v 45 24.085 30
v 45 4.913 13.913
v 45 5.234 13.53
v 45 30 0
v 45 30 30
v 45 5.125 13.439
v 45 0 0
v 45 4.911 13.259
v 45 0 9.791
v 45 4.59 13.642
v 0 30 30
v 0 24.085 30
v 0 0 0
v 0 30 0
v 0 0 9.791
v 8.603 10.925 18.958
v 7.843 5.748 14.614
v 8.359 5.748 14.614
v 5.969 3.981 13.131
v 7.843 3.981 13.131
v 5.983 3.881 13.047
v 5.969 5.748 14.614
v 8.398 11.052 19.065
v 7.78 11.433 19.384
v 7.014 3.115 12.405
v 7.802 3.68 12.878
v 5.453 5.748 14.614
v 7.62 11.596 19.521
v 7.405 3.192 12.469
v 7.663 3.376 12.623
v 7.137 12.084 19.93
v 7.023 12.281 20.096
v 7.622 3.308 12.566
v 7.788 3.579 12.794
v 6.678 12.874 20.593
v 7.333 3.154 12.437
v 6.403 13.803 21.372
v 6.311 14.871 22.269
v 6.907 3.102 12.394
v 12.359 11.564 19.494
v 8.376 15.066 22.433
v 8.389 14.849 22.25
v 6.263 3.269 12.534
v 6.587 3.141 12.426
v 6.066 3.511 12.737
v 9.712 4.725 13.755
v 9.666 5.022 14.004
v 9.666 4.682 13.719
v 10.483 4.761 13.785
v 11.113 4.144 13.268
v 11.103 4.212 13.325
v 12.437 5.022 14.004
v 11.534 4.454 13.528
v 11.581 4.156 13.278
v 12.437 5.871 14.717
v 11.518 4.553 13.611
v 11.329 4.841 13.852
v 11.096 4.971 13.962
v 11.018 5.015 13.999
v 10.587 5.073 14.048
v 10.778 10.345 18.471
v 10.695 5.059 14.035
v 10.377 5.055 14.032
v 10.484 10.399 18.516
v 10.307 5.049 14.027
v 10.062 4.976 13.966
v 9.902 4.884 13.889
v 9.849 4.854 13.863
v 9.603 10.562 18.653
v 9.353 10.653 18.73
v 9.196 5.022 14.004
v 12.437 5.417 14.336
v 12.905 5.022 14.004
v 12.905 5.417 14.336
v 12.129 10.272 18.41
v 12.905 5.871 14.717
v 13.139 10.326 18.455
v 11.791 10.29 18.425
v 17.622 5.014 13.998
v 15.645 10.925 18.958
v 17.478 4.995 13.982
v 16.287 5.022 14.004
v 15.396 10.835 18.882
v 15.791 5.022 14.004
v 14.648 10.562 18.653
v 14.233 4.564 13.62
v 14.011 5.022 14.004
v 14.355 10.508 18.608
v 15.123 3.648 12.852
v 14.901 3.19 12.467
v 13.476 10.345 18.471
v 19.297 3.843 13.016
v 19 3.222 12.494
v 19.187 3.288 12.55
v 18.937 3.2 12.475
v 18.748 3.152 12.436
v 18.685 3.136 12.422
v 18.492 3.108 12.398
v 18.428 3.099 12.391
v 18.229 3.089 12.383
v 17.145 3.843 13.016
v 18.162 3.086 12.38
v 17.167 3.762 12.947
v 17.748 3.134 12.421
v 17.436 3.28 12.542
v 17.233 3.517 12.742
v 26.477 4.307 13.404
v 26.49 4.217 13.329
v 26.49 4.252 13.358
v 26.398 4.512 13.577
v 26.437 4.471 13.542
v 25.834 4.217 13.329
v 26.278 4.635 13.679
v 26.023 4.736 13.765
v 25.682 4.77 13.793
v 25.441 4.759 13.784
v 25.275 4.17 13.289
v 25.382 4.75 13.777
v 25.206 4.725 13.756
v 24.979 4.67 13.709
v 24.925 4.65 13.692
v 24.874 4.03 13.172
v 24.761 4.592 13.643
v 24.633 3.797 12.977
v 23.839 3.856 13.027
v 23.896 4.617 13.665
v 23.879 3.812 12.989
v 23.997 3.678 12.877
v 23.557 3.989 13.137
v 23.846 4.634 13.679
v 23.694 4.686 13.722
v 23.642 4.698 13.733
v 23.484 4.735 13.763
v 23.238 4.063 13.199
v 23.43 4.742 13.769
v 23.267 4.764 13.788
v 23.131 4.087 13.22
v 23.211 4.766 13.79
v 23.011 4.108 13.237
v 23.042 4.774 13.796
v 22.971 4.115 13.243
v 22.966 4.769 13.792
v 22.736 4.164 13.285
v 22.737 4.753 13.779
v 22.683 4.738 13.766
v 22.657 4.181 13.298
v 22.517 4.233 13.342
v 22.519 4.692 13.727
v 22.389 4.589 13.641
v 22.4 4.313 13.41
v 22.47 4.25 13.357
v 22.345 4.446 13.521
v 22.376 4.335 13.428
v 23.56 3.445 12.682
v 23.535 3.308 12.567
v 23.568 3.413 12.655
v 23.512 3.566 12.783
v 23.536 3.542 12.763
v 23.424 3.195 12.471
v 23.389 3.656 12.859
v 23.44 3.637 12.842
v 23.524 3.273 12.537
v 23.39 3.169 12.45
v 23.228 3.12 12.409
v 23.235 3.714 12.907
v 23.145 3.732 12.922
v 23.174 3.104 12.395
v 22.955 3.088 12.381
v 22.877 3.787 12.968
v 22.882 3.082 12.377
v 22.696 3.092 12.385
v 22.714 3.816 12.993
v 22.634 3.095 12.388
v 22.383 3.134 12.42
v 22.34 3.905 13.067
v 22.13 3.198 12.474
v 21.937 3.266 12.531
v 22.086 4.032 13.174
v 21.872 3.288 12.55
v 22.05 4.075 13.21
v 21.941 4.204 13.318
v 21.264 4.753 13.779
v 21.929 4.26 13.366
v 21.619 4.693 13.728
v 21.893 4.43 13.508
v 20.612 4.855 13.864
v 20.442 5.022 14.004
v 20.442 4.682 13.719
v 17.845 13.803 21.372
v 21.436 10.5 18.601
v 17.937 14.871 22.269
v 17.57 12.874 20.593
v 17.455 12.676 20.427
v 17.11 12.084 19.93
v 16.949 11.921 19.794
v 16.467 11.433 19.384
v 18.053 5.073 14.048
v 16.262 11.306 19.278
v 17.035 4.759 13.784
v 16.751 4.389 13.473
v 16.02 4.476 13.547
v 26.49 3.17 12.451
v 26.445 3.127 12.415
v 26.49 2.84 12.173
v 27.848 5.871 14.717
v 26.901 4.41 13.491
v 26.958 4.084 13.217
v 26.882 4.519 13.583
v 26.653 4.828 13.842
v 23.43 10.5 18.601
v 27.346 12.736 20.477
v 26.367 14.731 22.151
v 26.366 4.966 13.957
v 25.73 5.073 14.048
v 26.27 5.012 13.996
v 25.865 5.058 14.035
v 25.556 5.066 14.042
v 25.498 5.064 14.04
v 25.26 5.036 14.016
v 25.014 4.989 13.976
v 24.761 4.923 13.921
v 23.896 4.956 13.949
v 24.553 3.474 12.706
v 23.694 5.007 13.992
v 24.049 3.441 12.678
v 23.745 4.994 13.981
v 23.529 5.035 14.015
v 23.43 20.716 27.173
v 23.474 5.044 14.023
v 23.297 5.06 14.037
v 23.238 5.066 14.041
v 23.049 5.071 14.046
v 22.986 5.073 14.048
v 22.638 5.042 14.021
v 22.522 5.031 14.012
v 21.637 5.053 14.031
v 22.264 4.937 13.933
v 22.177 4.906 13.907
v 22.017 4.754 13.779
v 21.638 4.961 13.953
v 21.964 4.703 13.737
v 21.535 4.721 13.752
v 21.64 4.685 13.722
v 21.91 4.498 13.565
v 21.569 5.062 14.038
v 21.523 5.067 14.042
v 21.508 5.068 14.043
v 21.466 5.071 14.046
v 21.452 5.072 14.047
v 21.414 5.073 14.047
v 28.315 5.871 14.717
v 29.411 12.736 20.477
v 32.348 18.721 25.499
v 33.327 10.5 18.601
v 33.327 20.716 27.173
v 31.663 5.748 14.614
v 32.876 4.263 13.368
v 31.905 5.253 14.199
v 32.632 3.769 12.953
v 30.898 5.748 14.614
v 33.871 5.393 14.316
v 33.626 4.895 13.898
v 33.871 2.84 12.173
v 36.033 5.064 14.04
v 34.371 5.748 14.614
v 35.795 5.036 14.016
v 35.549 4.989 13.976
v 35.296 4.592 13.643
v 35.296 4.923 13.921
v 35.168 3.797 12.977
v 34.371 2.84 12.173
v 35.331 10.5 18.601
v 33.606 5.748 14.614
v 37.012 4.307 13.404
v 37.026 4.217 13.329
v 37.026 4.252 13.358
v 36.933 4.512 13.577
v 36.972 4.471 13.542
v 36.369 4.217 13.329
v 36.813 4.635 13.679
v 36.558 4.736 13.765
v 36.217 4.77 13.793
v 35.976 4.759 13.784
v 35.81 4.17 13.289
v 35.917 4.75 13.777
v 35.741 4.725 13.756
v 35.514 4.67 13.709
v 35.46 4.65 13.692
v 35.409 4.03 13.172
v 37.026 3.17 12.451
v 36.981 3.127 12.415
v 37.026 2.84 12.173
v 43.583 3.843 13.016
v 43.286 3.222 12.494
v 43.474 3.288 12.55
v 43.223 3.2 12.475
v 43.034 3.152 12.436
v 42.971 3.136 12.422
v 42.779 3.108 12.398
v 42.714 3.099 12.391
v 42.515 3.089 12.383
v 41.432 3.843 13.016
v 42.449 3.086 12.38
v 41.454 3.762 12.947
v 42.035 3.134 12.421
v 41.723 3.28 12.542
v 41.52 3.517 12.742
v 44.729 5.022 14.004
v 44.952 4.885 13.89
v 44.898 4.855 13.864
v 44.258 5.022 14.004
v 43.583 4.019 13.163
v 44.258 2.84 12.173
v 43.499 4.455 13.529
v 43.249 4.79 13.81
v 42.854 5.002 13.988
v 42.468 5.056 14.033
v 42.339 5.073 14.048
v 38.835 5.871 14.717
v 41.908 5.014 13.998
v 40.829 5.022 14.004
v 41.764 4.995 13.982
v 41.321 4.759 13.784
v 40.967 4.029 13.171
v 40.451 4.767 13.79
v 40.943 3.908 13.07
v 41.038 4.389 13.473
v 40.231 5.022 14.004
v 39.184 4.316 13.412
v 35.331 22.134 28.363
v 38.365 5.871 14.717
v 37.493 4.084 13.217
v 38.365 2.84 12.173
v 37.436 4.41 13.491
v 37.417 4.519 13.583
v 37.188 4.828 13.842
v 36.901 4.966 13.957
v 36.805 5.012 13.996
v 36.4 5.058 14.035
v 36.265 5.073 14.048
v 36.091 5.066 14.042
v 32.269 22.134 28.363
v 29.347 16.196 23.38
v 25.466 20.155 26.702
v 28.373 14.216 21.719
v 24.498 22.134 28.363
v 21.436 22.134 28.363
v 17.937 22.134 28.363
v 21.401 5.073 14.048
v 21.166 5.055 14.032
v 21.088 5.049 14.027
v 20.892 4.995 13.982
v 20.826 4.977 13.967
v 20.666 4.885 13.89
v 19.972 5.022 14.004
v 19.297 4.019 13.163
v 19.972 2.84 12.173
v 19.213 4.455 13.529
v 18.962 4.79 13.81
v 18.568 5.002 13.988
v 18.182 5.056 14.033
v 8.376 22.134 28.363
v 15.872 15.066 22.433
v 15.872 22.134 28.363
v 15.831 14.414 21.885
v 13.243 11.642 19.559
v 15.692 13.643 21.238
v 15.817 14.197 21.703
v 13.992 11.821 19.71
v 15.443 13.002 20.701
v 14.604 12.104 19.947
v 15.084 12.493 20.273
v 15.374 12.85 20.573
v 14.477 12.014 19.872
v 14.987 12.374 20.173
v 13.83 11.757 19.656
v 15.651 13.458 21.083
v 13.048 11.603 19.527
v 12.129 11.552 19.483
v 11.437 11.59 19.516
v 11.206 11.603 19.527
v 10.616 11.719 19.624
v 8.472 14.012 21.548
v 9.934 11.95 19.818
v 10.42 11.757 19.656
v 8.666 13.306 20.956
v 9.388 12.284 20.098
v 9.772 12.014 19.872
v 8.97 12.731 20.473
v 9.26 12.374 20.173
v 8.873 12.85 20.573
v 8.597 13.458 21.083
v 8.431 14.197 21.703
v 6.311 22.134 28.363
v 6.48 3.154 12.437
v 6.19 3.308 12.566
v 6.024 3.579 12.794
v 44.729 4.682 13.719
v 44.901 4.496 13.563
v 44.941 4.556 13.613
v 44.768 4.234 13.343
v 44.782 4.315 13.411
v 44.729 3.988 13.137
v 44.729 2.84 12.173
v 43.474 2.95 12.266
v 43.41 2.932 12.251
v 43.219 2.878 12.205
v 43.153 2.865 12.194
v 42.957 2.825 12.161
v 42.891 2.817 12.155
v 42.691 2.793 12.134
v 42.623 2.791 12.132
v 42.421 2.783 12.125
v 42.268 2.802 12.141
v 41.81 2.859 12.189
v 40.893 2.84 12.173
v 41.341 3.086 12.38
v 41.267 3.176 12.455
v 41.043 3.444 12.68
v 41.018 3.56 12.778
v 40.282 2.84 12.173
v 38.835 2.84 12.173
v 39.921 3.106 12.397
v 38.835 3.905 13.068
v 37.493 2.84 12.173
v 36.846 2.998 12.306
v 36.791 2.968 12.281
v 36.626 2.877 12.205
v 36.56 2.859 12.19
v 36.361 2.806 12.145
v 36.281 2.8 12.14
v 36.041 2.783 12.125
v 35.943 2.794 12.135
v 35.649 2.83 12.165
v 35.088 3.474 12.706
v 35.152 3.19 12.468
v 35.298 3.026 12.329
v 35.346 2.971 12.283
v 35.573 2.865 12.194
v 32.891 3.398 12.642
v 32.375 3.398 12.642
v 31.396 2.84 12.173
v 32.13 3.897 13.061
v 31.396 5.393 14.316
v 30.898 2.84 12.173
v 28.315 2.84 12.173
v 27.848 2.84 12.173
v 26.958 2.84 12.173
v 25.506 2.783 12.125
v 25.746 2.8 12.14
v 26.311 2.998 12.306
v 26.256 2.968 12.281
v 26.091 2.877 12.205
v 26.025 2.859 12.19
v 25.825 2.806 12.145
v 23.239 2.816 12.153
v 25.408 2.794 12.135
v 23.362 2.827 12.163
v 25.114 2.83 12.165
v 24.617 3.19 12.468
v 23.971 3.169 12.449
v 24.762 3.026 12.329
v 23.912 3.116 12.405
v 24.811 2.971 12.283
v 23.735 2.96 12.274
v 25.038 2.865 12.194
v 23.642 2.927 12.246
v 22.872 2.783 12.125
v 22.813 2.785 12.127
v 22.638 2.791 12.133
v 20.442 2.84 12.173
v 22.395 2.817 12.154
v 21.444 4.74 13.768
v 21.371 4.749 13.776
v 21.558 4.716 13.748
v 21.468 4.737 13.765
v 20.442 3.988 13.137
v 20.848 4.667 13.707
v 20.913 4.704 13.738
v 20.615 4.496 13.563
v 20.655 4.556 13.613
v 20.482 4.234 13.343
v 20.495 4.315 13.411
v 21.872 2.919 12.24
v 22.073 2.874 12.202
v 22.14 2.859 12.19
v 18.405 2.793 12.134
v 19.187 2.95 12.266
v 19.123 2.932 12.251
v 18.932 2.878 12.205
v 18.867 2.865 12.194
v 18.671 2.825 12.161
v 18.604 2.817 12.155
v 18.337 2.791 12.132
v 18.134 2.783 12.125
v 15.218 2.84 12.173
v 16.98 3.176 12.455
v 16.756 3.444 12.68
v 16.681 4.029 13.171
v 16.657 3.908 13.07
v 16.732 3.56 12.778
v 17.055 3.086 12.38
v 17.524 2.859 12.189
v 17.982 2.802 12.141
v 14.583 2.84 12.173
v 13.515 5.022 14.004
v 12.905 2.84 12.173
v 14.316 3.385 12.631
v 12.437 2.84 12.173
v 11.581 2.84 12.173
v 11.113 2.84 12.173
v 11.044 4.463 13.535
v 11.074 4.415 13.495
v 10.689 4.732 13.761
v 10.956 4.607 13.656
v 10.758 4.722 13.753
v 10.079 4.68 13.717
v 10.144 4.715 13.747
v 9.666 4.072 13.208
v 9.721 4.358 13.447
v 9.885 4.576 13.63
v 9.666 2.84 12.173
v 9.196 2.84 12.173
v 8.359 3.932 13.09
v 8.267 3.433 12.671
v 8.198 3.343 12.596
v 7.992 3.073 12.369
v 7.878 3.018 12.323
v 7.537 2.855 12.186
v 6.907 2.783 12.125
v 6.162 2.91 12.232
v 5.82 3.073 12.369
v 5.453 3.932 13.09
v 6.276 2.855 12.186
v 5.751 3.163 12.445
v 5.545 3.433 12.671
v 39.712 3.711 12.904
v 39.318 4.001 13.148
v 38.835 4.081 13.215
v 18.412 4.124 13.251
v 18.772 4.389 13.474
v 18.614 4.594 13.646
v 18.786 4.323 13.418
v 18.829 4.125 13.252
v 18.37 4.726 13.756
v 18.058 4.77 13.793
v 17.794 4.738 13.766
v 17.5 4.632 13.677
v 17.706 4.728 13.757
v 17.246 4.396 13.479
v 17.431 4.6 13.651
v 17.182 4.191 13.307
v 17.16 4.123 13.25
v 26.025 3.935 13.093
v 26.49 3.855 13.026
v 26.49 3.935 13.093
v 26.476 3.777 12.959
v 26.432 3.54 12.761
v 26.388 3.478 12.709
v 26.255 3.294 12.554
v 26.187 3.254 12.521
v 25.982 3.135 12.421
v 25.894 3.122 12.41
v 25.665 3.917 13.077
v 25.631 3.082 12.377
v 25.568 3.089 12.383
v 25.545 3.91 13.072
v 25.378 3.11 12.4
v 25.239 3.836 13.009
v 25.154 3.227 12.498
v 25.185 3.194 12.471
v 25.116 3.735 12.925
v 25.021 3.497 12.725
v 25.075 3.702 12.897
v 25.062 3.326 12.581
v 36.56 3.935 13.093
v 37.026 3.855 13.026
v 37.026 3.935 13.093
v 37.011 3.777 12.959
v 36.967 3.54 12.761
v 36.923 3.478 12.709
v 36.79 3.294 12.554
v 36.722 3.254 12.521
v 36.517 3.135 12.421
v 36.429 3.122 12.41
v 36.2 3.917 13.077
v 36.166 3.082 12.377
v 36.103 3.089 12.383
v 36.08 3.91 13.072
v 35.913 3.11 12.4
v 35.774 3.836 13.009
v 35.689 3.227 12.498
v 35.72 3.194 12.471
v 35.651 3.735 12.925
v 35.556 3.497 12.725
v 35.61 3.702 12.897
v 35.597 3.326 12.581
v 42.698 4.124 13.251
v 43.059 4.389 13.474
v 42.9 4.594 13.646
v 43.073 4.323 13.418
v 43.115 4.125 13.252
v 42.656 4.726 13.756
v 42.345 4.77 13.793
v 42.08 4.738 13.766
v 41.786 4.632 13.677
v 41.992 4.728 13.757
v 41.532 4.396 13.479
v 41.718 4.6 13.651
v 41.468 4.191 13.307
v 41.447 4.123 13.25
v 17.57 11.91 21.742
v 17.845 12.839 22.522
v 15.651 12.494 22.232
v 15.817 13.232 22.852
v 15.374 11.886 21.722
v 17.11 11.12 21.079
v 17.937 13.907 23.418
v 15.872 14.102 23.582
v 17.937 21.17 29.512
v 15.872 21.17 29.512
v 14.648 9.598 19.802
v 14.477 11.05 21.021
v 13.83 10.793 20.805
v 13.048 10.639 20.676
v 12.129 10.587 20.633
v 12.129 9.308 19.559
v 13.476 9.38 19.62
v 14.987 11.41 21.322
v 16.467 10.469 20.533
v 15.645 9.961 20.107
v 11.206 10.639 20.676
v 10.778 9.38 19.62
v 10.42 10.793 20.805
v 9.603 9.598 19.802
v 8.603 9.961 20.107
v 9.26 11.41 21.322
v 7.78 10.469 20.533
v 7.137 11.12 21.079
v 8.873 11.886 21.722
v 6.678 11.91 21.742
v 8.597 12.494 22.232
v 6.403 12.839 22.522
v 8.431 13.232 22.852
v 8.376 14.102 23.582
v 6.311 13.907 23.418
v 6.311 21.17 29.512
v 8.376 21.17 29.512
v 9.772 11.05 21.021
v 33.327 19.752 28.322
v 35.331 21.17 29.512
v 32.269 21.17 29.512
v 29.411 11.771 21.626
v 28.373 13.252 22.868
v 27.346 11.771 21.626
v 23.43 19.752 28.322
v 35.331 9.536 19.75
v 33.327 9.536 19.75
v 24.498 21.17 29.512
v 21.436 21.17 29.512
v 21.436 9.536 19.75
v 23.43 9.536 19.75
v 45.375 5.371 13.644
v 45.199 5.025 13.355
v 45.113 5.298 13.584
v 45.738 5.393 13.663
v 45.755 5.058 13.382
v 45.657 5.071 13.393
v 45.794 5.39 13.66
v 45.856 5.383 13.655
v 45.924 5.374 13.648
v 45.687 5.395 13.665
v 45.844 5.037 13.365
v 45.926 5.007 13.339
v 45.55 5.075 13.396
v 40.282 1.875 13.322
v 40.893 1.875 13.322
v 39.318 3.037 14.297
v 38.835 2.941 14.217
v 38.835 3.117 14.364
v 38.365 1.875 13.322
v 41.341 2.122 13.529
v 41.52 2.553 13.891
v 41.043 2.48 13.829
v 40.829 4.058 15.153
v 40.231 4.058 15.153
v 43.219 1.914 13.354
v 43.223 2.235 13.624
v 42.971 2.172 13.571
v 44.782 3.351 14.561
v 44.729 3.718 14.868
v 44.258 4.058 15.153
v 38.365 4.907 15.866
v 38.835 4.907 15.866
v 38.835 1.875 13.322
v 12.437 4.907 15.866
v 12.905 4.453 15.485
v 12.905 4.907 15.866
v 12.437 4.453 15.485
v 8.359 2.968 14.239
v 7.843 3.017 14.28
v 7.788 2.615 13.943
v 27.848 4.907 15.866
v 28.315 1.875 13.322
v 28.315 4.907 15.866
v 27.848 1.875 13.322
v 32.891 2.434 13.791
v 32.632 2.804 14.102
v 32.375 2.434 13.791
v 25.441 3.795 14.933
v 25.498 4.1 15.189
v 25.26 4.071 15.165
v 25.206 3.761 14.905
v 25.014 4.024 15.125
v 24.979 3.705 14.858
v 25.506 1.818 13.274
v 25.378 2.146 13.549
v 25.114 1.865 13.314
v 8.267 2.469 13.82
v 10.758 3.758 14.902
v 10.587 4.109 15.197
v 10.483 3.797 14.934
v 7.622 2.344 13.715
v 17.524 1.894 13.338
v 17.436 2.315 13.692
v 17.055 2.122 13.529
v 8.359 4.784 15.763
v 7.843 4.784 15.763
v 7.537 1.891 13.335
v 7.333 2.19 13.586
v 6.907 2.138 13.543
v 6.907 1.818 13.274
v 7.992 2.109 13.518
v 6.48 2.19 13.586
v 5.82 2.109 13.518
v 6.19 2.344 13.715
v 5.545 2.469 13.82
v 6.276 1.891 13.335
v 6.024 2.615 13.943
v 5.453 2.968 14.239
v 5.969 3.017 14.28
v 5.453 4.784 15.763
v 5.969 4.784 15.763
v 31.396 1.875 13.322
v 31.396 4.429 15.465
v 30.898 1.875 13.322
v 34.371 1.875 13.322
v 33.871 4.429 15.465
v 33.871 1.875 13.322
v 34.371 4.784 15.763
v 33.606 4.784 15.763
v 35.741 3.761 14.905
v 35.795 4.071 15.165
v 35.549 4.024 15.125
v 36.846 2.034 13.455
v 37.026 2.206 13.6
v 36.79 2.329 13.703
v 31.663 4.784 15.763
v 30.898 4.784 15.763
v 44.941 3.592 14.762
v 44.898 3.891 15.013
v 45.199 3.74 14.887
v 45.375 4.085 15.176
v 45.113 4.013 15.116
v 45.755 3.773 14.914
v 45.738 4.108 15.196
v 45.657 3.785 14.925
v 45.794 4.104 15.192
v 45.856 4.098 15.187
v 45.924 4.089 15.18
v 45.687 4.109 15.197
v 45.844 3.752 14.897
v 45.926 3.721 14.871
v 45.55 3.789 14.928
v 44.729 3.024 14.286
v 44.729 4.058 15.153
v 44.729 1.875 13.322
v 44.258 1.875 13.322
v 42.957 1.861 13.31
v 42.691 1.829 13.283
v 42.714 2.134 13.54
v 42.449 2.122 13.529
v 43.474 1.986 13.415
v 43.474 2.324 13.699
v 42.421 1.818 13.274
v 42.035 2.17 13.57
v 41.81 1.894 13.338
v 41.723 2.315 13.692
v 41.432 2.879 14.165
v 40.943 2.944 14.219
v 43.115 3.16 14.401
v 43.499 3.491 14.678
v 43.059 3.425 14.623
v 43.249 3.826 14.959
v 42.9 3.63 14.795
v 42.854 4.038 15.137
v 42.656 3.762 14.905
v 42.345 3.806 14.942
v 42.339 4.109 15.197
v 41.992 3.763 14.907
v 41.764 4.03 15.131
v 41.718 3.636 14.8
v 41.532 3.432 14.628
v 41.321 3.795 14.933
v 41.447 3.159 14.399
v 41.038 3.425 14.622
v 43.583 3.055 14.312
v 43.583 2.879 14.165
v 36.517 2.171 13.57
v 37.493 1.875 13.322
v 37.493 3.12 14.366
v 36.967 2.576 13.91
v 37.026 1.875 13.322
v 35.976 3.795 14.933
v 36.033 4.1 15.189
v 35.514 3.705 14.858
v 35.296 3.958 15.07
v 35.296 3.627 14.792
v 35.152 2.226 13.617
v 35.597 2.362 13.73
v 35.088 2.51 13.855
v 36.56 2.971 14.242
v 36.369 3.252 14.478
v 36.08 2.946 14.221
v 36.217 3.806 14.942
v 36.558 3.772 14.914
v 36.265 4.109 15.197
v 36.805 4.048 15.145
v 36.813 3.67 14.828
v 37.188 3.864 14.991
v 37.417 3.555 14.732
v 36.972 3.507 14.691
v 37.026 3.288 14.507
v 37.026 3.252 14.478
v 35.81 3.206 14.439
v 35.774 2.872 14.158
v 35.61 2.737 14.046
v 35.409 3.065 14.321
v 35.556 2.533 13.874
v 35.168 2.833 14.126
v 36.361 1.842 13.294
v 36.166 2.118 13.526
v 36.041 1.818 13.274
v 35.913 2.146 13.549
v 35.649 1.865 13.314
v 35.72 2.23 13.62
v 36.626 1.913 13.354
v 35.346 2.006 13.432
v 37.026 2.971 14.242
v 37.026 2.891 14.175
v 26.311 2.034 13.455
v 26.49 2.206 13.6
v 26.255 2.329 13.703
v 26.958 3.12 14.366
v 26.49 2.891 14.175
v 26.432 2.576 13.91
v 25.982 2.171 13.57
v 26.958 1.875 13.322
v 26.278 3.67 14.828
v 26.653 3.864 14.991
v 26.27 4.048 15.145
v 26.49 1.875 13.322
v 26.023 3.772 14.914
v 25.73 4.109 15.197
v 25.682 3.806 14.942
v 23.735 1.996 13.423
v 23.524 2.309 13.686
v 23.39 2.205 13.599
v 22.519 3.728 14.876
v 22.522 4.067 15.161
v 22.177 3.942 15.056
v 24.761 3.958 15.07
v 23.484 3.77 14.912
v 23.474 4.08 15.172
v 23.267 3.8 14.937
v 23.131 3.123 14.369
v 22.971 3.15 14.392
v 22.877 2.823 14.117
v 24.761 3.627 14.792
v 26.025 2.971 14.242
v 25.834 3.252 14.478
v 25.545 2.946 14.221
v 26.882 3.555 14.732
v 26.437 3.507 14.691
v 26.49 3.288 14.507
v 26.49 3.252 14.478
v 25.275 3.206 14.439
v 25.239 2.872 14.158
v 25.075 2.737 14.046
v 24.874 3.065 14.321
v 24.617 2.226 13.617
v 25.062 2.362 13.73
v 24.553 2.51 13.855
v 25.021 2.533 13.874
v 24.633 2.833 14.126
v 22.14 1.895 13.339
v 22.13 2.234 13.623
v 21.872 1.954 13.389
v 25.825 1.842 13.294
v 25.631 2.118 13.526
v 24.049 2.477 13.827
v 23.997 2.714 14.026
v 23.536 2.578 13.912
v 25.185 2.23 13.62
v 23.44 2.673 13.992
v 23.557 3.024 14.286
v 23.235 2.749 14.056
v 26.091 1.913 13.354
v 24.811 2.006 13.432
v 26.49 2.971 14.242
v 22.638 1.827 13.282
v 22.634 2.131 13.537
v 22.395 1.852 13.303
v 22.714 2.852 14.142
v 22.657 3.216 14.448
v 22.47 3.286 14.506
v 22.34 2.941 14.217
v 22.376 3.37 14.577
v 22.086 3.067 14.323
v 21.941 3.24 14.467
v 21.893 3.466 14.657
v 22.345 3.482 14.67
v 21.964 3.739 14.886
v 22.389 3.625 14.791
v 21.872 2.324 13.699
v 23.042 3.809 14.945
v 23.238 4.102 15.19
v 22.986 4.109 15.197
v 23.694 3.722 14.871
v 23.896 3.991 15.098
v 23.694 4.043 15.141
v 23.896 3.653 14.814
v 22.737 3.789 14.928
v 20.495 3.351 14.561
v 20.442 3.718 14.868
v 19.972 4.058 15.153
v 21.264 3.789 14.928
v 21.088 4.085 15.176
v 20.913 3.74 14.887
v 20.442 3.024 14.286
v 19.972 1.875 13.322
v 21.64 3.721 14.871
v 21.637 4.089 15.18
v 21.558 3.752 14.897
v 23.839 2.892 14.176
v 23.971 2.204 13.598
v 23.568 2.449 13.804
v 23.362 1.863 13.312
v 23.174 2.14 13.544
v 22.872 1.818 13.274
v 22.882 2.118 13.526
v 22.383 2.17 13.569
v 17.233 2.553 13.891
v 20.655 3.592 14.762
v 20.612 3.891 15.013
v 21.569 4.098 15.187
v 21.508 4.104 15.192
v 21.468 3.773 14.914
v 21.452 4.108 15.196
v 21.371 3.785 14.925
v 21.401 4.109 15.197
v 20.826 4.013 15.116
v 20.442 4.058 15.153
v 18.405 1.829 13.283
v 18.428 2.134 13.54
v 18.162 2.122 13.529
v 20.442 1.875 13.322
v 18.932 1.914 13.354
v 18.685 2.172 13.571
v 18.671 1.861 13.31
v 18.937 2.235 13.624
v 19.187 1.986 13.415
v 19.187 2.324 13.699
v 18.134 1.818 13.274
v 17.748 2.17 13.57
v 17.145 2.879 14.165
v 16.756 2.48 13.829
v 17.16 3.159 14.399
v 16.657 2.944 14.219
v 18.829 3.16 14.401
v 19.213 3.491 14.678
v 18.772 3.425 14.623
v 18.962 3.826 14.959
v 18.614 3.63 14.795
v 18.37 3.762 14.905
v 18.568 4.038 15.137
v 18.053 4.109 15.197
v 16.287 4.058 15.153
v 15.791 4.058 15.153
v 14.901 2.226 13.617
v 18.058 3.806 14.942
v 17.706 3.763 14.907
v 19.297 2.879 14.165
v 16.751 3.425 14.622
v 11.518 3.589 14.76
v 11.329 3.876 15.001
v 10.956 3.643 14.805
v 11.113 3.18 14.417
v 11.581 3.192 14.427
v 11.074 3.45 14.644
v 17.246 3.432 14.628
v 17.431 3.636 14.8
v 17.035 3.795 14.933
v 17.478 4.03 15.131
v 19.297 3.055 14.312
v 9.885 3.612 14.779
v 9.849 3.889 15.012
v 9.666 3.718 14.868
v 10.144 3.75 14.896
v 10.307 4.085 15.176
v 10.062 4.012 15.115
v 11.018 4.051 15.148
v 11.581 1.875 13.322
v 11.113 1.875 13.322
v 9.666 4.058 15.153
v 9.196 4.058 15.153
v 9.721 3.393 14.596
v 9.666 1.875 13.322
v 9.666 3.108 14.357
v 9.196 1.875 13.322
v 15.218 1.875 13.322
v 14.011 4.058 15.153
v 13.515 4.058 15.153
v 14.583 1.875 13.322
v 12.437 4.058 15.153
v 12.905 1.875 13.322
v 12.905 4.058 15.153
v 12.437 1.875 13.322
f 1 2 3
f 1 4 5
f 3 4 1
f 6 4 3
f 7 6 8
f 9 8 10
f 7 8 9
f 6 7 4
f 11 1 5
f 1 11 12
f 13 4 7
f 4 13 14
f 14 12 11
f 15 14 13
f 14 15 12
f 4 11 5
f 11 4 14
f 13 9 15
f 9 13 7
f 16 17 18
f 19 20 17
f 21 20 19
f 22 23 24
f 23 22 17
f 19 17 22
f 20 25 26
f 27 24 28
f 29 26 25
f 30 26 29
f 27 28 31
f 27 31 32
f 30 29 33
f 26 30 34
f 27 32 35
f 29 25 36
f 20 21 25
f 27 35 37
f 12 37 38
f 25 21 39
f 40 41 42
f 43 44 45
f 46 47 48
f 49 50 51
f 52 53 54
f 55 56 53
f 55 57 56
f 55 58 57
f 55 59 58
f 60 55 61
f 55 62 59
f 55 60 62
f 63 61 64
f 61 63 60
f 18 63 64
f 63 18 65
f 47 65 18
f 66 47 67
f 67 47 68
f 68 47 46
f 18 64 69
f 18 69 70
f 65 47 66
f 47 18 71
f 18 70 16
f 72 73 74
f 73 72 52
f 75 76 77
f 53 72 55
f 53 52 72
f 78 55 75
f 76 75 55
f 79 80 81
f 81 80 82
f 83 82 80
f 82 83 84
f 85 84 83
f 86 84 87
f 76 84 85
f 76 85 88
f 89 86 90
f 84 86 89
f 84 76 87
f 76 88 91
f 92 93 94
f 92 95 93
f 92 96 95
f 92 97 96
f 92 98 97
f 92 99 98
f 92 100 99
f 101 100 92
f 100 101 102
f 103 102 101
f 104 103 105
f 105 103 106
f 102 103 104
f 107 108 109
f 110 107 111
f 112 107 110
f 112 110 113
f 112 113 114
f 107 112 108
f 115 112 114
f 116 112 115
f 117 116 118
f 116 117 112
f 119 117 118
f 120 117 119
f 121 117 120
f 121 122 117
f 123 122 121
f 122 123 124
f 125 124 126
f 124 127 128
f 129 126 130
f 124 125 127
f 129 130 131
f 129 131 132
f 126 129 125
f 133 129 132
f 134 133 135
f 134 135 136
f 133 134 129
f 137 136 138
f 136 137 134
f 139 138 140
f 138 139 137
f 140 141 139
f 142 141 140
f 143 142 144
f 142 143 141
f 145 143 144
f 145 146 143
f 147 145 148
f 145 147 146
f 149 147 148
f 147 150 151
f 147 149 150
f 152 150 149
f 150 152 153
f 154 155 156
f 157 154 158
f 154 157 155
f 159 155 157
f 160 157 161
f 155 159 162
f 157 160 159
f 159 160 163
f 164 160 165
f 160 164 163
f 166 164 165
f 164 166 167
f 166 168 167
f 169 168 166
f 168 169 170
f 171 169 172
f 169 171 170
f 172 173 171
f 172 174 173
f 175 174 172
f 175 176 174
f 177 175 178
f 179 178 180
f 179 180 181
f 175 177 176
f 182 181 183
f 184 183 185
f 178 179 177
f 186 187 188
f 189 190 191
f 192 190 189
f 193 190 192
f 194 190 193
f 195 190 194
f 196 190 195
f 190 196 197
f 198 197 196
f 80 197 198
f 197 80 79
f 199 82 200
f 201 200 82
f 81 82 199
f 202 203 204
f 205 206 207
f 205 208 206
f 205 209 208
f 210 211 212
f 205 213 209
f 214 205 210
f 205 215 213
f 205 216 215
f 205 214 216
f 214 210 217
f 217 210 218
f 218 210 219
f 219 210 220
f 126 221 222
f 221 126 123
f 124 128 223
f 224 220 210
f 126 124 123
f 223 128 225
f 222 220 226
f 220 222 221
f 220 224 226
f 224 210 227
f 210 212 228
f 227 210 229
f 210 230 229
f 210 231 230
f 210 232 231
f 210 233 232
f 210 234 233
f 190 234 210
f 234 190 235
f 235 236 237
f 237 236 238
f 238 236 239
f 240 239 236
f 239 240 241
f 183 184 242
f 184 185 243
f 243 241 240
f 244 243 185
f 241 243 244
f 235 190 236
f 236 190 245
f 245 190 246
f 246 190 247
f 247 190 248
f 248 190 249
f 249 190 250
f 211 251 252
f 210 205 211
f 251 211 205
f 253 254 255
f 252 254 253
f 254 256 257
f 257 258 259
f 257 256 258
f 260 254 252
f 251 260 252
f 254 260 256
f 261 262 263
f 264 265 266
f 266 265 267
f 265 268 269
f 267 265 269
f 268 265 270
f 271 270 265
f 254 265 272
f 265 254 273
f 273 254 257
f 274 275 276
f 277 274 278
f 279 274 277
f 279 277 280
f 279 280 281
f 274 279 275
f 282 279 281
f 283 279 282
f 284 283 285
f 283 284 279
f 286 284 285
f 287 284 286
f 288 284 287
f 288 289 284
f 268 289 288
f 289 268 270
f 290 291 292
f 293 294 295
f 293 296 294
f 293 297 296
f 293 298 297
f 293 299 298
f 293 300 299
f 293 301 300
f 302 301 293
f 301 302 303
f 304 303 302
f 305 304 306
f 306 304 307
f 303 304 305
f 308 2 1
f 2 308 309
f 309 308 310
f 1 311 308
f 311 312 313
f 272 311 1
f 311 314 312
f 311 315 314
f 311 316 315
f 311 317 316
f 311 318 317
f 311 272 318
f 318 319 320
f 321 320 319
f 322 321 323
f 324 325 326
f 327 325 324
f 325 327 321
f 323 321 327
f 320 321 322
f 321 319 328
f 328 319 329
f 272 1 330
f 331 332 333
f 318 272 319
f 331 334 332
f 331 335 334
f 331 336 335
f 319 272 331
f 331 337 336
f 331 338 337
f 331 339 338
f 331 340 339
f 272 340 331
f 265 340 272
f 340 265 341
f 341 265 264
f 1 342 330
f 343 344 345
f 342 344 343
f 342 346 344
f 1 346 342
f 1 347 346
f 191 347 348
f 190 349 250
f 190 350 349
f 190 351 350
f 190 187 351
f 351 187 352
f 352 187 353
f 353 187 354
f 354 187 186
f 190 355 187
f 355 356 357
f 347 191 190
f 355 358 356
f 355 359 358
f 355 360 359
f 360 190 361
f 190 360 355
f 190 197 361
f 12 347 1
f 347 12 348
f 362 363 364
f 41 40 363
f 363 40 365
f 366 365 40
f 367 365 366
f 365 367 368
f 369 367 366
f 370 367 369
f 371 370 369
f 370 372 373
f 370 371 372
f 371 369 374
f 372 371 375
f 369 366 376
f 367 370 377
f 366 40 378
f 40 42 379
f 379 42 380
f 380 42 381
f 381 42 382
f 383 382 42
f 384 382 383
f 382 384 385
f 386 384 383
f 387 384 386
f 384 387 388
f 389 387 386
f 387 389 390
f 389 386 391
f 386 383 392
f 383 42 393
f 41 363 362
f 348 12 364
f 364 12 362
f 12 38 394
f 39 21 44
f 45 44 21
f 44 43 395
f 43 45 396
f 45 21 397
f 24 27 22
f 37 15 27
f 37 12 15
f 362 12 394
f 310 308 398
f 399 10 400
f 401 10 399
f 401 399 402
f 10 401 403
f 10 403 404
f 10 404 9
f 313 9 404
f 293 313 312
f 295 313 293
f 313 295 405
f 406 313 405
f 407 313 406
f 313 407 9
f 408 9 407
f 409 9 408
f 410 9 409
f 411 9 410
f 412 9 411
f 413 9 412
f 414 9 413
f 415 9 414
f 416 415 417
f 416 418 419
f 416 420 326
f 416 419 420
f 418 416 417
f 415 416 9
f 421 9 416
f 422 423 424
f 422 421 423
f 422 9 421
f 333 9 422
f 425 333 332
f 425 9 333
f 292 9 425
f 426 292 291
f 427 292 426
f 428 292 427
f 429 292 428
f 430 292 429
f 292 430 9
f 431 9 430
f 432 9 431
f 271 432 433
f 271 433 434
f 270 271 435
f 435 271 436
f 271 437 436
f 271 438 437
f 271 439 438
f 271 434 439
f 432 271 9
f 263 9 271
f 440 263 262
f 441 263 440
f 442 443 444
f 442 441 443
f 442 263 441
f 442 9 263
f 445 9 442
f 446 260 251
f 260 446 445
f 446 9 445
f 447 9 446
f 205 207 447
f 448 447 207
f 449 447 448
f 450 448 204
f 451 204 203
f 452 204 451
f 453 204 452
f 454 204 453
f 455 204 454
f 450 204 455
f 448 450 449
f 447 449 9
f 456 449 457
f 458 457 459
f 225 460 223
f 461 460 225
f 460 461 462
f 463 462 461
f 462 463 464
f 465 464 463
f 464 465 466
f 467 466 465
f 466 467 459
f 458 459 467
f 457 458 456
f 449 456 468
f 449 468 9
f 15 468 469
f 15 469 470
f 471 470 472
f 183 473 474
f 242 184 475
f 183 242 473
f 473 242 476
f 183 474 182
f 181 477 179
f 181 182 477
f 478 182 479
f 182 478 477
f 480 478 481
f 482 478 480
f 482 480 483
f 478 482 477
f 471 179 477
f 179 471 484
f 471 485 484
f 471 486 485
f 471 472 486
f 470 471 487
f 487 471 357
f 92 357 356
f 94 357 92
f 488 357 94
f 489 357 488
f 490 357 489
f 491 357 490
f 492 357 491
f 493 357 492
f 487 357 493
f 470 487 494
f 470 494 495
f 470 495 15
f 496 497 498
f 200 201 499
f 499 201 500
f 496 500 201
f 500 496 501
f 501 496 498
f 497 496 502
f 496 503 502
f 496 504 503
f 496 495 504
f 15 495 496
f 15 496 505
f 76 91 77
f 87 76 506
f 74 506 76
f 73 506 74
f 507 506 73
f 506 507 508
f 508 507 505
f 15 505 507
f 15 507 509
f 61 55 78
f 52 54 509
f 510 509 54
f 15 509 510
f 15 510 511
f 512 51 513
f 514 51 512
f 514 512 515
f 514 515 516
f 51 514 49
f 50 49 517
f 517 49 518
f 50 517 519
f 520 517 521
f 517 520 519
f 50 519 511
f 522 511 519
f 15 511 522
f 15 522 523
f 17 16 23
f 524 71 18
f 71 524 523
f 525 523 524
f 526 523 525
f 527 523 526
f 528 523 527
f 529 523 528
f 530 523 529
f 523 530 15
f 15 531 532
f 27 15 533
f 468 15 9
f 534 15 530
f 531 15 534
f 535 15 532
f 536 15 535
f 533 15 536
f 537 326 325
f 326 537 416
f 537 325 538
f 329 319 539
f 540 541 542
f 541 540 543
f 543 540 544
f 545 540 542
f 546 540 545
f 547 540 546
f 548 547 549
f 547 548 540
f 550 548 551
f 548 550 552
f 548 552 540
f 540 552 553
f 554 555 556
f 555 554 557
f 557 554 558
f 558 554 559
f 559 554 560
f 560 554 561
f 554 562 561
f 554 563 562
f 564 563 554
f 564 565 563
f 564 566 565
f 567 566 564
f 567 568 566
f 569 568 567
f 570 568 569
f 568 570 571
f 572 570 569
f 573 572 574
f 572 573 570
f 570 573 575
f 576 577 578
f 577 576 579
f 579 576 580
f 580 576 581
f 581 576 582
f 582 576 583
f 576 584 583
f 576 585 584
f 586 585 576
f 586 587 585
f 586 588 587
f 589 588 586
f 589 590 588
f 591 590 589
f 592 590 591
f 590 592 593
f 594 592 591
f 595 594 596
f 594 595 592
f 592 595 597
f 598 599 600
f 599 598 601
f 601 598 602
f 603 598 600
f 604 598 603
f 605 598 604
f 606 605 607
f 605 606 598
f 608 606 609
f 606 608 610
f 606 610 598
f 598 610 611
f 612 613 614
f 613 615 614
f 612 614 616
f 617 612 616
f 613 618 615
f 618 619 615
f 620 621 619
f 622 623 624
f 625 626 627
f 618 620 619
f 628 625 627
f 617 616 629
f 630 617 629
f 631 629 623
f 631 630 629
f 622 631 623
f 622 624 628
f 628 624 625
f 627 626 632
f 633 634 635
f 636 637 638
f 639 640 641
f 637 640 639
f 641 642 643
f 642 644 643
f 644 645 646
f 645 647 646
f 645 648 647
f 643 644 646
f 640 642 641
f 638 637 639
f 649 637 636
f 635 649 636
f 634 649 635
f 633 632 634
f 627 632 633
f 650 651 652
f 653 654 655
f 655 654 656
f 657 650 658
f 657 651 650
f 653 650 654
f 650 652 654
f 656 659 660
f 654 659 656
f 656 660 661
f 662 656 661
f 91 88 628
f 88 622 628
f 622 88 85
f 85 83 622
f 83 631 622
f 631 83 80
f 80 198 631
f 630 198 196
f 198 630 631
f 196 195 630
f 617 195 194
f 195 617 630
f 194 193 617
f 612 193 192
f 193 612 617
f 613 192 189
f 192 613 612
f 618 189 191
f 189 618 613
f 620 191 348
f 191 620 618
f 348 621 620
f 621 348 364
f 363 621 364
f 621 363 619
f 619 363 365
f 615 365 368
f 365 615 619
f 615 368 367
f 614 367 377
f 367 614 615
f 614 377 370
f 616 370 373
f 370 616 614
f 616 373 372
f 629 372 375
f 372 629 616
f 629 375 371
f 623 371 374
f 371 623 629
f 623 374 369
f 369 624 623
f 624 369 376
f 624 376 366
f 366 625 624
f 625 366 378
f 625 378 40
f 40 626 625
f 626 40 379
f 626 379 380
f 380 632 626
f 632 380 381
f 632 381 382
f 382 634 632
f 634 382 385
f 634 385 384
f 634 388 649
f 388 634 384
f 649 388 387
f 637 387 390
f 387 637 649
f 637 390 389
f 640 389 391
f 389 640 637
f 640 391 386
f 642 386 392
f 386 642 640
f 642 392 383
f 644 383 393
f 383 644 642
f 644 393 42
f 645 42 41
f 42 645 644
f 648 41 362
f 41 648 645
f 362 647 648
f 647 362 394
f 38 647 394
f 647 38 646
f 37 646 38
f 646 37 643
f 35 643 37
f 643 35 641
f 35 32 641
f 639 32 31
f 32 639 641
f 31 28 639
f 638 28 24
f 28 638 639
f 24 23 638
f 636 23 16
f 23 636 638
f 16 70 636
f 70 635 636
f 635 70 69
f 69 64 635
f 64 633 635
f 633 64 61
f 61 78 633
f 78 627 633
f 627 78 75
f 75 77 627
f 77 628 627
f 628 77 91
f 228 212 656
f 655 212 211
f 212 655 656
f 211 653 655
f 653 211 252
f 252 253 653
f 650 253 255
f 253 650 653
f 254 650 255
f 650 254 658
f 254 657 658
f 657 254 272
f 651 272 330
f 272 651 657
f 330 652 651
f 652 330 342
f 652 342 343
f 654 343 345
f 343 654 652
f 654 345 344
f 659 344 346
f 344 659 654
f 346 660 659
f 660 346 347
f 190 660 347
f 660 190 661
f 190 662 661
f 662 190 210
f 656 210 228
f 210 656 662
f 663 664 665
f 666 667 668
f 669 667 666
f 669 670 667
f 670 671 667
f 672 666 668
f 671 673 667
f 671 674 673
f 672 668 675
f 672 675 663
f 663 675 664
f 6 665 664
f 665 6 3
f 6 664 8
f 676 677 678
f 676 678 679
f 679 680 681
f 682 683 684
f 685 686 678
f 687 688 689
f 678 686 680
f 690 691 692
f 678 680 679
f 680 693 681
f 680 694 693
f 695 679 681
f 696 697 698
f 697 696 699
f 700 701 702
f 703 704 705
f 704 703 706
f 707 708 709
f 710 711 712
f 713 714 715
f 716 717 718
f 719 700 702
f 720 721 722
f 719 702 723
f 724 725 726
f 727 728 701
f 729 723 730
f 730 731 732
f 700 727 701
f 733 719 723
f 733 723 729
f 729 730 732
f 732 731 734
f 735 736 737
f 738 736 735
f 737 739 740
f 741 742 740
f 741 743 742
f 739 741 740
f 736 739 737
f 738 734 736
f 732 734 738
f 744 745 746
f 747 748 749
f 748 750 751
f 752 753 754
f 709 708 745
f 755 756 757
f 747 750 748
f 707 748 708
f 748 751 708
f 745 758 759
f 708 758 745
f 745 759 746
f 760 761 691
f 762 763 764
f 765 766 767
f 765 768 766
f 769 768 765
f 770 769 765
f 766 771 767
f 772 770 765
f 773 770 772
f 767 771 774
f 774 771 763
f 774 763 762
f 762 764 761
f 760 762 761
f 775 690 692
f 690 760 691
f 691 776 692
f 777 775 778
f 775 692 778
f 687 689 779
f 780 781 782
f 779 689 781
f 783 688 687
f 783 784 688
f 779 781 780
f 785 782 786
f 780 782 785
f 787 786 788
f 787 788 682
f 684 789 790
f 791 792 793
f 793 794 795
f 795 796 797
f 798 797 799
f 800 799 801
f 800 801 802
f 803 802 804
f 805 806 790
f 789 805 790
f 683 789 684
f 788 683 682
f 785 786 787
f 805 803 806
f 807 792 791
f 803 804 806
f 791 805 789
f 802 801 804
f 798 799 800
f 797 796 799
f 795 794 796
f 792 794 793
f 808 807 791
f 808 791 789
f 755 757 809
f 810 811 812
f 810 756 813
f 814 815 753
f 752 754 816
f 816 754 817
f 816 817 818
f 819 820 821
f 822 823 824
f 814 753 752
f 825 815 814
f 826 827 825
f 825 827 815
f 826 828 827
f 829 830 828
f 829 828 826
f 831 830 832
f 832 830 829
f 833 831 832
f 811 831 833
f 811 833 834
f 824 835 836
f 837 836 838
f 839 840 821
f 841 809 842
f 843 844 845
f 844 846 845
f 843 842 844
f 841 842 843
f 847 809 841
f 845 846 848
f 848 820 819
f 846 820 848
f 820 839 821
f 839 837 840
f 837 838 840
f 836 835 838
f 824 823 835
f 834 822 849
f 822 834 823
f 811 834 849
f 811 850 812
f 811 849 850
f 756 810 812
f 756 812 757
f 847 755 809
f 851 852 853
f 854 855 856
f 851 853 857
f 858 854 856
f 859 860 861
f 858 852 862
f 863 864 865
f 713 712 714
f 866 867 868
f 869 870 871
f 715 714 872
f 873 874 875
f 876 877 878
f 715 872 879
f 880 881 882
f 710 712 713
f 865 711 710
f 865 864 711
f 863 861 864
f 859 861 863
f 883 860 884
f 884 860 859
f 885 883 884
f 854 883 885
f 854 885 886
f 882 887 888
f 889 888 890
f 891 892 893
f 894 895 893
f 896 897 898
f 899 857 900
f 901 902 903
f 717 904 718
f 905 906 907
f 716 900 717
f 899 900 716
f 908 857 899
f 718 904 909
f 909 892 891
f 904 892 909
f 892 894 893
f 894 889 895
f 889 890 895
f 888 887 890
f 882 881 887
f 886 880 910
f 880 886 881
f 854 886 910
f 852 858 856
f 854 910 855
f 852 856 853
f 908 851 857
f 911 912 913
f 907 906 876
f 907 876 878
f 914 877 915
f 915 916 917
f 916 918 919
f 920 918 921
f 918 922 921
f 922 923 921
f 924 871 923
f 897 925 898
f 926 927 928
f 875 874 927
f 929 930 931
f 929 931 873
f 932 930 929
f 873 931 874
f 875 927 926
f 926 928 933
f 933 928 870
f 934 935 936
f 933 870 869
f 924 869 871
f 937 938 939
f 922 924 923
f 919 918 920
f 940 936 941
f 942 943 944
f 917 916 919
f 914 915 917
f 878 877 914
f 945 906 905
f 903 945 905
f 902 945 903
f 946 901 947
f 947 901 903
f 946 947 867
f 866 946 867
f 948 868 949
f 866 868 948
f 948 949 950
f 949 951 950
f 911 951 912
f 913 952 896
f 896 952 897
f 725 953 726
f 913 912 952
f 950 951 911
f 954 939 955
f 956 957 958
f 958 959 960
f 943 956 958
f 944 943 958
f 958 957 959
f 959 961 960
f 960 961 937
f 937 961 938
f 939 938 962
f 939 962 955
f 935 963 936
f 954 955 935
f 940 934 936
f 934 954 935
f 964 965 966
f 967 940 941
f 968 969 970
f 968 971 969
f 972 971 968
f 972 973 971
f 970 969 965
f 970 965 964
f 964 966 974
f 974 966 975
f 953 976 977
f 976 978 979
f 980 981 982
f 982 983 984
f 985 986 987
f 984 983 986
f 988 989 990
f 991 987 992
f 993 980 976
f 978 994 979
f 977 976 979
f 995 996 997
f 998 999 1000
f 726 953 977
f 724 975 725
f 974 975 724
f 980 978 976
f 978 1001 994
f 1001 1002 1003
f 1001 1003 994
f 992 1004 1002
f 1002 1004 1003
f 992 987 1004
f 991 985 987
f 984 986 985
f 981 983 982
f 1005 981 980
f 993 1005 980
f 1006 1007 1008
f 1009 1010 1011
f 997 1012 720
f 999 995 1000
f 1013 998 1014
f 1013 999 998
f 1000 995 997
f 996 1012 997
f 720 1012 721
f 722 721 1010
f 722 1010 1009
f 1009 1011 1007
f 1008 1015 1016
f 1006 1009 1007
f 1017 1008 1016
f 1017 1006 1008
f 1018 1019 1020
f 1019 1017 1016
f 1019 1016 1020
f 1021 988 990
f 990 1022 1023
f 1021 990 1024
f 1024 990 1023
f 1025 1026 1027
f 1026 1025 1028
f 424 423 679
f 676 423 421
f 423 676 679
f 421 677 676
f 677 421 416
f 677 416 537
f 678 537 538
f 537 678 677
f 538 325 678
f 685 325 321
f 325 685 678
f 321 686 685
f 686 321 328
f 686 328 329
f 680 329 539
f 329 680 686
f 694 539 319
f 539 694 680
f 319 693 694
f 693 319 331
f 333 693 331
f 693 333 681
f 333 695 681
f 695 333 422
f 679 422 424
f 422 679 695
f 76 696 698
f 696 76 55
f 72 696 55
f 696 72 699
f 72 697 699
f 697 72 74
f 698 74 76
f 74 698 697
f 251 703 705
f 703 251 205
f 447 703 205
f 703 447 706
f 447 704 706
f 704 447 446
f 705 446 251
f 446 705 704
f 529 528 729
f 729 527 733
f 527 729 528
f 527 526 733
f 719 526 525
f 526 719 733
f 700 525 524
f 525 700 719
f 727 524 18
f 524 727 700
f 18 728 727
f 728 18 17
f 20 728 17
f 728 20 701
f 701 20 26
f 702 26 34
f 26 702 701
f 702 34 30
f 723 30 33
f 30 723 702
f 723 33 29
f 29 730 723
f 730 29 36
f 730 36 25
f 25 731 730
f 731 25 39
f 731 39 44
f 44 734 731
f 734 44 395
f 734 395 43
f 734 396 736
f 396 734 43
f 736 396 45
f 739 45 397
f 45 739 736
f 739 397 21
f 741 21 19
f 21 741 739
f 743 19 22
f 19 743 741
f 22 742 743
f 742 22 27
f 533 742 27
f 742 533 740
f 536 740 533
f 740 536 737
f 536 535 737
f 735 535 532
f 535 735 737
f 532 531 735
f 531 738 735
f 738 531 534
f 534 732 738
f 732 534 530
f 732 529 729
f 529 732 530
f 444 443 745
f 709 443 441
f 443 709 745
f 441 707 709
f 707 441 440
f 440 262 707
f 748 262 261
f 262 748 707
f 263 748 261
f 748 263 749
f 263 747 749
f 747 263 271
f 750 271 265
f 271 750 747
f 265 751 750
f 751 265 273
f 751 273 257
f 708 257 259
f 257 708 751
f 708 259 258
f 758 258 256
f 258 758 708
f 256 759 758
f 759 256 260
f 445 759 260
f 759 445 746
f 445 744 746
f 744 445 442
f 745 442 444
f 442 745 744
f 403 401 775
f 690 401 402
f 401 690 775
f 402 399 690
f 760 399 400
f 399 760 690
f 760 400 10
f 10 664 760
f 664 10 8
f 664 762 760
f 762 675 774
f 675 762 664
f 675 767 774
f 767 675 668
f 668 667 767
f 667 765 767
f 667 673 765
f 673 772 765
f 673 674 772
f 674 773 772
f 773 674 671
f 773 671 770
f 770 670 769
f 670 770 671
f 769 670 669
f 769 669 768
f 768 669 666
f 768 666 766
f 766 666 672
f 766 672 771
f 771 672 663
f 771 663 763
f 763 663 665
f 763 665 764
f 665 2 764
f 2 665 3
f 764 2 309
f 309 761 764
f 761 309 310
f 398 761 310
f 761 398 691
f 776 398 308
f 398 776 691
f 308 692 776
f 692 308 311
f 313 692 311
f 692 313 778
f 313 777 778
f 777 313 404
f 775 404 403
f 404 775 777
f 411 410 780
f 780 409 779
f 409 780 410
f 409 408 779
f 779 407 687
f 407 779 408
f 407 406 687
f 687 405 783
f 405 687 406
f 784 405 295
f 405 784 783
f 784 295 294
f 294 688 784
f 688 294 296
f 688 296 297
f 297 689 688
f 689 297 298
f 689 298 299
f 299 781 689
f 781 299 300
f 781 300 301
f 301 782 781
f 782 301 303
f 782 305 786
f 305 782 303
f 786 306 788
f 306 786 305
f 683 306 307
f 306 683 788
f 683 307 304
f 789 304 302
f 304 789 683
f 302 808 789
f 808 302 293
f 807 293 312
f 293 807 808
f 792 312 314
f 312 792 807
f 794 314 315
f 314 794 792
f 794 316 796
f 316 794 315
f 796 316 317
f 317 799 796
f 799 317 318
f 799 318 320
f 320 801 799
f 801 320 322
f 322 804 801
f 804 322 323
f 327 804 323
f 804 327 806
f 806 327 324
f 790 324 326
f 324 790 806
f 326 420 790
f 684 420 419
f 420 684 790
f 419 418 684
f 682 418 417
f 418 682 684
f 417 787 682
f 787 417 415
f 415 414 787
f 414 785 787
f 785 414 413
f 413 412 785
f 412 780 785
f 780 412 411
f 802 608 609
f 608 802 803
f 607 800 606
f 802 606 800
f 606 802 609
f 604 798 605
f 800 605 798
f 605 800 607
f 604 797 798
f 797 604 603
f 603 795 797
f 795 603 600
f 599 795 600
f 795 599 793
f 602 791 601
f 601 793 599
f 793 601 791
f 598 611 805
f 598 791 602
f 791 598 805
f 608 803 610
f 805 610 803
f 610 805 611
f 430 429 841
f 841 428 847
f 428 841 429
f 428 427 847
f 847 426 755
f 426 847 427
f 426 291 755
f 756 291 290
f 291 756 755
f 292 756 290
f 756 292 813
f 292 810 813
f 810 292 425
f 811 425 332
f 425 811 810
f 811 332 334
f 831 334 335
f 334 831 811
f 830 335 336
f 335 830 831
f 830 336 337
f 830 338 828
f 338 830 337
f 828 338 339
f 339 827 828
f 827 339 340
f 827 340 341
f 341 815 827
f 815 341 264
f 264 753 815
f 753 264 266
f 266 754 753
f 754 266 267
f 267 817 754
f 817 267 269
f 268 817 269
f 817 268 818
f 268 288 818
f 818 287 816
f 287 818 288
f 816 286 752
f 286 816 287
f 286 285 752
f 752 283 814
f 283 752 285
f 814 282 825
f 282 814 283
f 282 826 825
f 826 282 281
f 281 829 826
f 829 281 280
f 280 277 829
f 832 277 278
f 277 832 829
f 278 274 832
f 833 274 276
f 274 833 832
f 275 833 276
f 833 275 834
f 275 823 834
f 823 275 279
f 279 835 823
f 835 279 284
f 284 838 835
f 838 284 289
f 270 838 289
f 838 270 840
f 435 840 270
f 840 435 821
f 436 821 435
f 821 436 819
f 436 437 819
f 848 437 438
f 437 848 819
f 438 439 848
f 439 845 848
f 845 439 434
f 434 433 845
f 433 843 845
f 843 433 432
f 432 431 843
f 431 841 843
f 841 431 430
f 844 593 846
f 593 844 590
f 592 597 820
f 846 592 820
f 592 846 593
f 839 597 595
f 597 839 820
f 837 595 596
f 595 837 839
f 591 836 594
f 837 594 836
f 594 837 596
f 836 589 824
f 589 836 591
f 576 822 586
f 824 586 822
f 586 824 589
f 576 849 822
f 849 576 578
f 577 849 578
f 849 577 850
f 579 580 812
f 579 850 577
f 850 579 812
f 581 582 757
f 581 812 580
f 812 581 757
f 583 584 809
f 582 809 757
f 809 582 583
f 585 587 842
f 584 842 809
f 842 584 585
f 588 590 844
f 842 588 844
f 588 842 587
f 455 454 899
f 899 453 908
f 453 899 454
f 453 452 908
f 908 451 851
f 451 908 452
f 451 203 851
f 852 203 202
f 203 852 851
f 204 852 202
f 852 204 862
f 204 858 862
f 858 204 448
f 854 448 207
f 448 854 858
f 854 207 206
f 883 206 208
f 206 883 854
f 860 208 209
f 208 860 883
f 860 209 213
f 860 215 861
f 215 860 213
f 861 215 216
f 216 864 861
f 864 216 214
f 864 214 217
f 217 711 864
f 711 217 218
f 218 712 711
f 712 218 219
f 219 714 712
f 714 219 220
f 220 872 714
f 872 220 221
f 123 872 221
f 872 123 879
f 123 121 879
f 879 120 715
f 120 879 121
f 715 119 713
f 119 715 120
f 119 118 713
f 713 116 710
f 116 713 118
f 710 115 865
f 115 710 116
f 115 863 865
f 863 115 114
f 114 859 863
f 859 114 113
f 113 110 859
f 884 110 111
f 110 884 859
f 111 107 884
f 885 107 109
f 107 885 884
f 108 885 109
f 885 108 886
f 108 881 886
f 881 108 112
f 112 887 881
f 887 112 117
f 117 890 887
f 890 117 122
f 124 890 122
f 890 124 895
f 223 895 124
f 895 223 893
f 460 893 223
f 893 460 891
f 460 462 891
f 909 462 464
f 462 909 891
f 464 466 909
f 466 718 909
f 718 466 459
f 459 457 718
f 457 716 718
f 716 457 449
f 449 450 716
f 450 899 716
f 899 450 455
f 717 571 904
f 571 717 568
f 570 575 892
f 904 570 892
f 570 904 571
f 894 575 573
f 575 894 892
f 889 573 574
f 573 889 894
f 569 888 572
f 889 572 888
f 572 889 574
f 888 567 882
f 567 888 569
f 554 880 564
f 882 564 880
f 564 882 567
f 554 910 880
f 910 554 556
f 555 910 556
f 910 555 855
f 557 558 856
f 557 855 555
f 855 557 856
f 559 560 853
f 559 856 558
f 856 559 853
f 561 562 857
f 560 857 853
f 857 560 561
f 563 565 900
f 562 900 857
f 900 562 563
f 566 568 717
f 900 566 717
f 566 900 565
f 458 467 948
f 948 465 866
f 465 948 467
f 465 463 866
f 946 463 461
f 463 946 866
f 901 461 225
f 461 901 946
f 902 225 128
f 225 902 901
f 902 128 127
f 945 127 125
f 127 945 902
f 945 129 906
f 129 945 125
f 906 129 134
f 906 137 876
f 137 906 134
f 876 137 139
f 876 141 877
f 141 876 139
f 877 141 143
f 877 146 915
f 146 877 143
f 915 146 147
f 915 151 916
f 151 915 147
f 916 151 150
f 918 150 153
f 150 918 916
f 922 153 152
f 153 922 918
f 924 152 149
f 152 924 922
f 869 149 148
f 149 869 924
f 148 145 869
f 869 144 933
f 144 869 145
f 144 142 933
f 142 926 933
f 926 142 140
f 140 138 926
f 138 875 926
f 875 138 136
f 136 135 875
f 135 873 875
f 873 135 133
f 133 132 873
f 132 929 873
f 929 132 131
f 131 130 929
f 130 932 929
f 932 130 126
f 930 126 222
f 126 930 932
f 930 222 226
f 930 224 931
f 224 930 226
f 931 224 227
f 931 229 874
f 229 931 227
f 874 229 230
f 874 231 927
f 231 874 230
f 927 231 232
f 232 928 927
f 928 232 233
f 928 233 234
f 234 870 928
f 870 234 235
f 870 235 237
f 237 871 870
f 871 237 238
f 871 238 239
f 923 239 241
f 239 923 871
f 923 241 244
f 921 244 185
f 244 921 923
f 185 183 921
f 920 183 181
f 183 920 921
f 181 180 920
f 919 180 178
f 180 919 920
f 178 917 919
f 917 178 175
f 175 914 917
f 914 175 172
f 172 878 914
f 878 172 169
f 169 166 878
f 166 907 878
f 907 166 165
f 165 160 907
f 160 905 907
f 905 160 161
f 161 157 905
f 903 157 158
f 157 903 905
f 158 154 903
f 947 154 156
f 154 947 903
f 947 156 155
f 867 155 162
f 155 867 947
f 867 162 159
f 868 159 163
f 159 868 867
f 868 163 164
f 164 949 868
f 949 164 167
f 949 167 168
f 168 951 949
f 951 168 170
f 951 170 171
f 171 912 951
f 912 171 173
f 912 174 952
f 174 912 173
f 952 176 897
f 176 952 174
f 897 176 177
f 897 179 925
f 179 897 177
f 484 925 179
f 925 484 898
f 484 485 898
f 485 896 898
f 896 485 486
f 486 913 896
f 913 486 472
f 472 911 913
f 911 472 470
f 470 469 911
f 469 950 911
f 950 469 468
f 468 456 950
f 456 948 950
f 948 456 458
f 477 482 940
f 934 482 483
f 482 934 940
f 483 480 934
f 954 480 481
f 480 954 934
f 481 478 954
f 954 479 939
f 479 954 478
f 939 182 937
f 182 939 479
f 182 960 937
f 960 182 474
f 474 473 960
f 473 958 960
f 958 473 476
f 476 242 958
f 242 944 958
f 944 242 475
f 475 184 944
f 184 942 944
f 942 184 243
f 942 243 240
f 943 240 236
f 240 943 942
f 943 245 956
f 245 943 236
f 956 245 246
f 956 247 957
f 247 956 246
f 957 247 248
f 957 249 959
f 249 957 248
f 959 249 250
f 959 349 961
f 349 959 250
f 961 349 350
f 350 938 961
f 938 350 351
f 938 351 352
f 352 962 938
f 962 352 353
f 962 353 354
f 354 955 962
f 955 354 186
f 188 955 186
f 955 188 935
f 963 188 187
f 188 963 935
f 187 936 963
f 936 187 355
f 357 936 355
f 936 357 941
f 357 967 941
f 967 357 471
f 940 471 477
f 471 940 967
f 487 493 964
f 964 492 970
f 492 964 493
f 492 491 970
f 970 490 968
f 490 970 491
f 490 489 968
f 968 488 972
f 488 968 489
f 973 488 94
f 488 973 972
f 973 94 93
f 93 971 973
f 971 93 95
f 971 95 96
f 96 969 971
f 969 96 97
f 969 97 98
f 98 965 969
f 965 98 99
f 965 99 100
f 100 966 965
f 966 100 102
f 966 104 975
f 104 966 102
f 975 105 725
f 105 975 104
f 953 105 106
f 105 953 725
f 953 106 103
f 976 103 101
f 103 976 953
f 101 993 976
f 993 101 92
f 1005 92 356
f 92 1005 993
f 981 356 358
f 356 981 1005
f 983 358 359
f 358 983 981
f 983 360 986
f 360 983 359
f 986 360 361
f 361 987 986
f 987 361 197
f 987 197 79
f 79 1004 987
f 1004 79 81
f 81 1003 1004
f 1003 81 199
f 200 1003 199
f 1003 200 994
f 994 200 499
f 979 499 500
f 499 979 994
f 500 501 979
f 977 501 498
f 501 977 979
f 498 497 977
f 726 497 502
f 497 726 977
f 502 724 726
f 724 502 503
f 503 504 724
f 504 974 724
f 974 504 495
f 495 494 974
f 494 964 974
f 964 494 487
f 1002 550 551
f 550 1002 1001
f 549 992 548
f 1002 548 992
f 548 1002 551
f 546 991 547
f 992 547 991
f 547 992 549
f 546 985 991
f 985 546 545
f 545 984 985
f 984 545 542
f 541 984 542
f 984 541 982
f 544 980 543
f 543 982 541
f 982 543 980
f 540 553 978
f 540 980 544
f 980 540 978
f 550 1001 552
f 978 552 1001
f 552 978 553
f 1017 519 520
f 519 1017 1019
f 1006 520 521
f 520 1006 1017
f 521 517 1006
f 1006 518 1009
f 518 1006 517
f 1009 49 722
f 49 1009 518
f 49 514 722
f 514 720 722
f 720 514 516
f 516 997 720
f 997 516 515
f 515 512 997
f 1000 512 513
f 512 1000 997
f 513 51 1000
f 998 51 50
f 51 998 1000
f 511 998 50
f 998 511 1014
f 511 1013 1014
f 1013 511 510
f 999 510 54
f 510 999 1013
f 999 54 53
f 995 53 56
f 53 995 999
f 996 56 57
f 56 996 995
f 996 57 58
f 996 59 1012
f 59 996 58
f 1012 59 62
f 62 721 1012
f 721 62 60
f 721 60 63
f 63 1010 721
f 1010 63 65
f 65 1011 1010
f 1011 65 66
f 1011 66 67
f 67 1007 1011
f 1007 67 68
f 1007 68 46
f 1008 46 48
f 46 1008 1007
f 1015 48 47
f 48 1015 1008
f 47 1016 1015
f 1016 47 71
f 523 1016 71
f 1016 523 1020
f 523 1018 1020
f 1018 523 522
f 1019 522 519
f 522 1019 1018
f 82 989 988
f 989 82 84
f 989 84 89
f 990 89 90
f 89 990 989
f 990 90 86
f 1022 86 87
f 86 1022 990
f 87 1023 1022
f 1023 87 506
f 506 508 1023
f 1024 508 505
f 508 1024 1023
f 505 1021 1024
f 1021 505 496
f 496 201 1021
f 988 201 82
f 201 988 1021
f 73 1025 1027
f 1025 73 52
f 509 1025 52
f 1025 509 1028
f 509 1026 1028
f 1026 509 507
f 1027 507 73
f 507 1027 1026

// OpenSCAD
//!OpenSCAD

width = 45;
depth = 30;
height = 30;
cutter_cube_angle = 40;
lower_cutter_cube_offset = 20;
my_1_line_font_size = 20;
my_1_line_text = "UM";
my_2_line_font_size = 5;
my_2_line_text = "Universal Maker";

union(){
  difference() {
    cube([width, depth, height], center=false);

    rotate([cutter_cube_angle, 0, 0]){
      translate([0, lower_cutter_cube_offset, (-1000 - lower_cutter_cube_offset)]){
        cube([1000, 1000, 1000], center=false);
      }
    }
    rotate([cutter_cube_angle, 0, 0]){
      translate([0, 0, (height / 4)]){
        cube([1000, 1000, 1000], center=false);
      }
    }
  }
  rotate([cutter_cube_angle, 0, 0]){
    translate([(width / 2 - len(my_1_line_text) * 9), 20, 7]){
      // size is multiplied by 0.75 because openScad font sizes are in points, not pixels
      linear_extrude( height=2, twist=0, center=false){
        text(str(my_1_line_text), font = "Roboto", size = my_1_line_font_size*0.75);
      }

    }
  }
  rotate([cutter_cube_angle, 0, 0]){
    translate([5, 10, 7]){
      // size is multiplied by 0.75 because openScad font sizes are in points, not pixels
      linear_extrude( height=2, twist=0, center=false){
        text(str(my_2_line_text), font = "Roboto", size = my_2_line_font_size*0.75);
      }

    }
  }
}
